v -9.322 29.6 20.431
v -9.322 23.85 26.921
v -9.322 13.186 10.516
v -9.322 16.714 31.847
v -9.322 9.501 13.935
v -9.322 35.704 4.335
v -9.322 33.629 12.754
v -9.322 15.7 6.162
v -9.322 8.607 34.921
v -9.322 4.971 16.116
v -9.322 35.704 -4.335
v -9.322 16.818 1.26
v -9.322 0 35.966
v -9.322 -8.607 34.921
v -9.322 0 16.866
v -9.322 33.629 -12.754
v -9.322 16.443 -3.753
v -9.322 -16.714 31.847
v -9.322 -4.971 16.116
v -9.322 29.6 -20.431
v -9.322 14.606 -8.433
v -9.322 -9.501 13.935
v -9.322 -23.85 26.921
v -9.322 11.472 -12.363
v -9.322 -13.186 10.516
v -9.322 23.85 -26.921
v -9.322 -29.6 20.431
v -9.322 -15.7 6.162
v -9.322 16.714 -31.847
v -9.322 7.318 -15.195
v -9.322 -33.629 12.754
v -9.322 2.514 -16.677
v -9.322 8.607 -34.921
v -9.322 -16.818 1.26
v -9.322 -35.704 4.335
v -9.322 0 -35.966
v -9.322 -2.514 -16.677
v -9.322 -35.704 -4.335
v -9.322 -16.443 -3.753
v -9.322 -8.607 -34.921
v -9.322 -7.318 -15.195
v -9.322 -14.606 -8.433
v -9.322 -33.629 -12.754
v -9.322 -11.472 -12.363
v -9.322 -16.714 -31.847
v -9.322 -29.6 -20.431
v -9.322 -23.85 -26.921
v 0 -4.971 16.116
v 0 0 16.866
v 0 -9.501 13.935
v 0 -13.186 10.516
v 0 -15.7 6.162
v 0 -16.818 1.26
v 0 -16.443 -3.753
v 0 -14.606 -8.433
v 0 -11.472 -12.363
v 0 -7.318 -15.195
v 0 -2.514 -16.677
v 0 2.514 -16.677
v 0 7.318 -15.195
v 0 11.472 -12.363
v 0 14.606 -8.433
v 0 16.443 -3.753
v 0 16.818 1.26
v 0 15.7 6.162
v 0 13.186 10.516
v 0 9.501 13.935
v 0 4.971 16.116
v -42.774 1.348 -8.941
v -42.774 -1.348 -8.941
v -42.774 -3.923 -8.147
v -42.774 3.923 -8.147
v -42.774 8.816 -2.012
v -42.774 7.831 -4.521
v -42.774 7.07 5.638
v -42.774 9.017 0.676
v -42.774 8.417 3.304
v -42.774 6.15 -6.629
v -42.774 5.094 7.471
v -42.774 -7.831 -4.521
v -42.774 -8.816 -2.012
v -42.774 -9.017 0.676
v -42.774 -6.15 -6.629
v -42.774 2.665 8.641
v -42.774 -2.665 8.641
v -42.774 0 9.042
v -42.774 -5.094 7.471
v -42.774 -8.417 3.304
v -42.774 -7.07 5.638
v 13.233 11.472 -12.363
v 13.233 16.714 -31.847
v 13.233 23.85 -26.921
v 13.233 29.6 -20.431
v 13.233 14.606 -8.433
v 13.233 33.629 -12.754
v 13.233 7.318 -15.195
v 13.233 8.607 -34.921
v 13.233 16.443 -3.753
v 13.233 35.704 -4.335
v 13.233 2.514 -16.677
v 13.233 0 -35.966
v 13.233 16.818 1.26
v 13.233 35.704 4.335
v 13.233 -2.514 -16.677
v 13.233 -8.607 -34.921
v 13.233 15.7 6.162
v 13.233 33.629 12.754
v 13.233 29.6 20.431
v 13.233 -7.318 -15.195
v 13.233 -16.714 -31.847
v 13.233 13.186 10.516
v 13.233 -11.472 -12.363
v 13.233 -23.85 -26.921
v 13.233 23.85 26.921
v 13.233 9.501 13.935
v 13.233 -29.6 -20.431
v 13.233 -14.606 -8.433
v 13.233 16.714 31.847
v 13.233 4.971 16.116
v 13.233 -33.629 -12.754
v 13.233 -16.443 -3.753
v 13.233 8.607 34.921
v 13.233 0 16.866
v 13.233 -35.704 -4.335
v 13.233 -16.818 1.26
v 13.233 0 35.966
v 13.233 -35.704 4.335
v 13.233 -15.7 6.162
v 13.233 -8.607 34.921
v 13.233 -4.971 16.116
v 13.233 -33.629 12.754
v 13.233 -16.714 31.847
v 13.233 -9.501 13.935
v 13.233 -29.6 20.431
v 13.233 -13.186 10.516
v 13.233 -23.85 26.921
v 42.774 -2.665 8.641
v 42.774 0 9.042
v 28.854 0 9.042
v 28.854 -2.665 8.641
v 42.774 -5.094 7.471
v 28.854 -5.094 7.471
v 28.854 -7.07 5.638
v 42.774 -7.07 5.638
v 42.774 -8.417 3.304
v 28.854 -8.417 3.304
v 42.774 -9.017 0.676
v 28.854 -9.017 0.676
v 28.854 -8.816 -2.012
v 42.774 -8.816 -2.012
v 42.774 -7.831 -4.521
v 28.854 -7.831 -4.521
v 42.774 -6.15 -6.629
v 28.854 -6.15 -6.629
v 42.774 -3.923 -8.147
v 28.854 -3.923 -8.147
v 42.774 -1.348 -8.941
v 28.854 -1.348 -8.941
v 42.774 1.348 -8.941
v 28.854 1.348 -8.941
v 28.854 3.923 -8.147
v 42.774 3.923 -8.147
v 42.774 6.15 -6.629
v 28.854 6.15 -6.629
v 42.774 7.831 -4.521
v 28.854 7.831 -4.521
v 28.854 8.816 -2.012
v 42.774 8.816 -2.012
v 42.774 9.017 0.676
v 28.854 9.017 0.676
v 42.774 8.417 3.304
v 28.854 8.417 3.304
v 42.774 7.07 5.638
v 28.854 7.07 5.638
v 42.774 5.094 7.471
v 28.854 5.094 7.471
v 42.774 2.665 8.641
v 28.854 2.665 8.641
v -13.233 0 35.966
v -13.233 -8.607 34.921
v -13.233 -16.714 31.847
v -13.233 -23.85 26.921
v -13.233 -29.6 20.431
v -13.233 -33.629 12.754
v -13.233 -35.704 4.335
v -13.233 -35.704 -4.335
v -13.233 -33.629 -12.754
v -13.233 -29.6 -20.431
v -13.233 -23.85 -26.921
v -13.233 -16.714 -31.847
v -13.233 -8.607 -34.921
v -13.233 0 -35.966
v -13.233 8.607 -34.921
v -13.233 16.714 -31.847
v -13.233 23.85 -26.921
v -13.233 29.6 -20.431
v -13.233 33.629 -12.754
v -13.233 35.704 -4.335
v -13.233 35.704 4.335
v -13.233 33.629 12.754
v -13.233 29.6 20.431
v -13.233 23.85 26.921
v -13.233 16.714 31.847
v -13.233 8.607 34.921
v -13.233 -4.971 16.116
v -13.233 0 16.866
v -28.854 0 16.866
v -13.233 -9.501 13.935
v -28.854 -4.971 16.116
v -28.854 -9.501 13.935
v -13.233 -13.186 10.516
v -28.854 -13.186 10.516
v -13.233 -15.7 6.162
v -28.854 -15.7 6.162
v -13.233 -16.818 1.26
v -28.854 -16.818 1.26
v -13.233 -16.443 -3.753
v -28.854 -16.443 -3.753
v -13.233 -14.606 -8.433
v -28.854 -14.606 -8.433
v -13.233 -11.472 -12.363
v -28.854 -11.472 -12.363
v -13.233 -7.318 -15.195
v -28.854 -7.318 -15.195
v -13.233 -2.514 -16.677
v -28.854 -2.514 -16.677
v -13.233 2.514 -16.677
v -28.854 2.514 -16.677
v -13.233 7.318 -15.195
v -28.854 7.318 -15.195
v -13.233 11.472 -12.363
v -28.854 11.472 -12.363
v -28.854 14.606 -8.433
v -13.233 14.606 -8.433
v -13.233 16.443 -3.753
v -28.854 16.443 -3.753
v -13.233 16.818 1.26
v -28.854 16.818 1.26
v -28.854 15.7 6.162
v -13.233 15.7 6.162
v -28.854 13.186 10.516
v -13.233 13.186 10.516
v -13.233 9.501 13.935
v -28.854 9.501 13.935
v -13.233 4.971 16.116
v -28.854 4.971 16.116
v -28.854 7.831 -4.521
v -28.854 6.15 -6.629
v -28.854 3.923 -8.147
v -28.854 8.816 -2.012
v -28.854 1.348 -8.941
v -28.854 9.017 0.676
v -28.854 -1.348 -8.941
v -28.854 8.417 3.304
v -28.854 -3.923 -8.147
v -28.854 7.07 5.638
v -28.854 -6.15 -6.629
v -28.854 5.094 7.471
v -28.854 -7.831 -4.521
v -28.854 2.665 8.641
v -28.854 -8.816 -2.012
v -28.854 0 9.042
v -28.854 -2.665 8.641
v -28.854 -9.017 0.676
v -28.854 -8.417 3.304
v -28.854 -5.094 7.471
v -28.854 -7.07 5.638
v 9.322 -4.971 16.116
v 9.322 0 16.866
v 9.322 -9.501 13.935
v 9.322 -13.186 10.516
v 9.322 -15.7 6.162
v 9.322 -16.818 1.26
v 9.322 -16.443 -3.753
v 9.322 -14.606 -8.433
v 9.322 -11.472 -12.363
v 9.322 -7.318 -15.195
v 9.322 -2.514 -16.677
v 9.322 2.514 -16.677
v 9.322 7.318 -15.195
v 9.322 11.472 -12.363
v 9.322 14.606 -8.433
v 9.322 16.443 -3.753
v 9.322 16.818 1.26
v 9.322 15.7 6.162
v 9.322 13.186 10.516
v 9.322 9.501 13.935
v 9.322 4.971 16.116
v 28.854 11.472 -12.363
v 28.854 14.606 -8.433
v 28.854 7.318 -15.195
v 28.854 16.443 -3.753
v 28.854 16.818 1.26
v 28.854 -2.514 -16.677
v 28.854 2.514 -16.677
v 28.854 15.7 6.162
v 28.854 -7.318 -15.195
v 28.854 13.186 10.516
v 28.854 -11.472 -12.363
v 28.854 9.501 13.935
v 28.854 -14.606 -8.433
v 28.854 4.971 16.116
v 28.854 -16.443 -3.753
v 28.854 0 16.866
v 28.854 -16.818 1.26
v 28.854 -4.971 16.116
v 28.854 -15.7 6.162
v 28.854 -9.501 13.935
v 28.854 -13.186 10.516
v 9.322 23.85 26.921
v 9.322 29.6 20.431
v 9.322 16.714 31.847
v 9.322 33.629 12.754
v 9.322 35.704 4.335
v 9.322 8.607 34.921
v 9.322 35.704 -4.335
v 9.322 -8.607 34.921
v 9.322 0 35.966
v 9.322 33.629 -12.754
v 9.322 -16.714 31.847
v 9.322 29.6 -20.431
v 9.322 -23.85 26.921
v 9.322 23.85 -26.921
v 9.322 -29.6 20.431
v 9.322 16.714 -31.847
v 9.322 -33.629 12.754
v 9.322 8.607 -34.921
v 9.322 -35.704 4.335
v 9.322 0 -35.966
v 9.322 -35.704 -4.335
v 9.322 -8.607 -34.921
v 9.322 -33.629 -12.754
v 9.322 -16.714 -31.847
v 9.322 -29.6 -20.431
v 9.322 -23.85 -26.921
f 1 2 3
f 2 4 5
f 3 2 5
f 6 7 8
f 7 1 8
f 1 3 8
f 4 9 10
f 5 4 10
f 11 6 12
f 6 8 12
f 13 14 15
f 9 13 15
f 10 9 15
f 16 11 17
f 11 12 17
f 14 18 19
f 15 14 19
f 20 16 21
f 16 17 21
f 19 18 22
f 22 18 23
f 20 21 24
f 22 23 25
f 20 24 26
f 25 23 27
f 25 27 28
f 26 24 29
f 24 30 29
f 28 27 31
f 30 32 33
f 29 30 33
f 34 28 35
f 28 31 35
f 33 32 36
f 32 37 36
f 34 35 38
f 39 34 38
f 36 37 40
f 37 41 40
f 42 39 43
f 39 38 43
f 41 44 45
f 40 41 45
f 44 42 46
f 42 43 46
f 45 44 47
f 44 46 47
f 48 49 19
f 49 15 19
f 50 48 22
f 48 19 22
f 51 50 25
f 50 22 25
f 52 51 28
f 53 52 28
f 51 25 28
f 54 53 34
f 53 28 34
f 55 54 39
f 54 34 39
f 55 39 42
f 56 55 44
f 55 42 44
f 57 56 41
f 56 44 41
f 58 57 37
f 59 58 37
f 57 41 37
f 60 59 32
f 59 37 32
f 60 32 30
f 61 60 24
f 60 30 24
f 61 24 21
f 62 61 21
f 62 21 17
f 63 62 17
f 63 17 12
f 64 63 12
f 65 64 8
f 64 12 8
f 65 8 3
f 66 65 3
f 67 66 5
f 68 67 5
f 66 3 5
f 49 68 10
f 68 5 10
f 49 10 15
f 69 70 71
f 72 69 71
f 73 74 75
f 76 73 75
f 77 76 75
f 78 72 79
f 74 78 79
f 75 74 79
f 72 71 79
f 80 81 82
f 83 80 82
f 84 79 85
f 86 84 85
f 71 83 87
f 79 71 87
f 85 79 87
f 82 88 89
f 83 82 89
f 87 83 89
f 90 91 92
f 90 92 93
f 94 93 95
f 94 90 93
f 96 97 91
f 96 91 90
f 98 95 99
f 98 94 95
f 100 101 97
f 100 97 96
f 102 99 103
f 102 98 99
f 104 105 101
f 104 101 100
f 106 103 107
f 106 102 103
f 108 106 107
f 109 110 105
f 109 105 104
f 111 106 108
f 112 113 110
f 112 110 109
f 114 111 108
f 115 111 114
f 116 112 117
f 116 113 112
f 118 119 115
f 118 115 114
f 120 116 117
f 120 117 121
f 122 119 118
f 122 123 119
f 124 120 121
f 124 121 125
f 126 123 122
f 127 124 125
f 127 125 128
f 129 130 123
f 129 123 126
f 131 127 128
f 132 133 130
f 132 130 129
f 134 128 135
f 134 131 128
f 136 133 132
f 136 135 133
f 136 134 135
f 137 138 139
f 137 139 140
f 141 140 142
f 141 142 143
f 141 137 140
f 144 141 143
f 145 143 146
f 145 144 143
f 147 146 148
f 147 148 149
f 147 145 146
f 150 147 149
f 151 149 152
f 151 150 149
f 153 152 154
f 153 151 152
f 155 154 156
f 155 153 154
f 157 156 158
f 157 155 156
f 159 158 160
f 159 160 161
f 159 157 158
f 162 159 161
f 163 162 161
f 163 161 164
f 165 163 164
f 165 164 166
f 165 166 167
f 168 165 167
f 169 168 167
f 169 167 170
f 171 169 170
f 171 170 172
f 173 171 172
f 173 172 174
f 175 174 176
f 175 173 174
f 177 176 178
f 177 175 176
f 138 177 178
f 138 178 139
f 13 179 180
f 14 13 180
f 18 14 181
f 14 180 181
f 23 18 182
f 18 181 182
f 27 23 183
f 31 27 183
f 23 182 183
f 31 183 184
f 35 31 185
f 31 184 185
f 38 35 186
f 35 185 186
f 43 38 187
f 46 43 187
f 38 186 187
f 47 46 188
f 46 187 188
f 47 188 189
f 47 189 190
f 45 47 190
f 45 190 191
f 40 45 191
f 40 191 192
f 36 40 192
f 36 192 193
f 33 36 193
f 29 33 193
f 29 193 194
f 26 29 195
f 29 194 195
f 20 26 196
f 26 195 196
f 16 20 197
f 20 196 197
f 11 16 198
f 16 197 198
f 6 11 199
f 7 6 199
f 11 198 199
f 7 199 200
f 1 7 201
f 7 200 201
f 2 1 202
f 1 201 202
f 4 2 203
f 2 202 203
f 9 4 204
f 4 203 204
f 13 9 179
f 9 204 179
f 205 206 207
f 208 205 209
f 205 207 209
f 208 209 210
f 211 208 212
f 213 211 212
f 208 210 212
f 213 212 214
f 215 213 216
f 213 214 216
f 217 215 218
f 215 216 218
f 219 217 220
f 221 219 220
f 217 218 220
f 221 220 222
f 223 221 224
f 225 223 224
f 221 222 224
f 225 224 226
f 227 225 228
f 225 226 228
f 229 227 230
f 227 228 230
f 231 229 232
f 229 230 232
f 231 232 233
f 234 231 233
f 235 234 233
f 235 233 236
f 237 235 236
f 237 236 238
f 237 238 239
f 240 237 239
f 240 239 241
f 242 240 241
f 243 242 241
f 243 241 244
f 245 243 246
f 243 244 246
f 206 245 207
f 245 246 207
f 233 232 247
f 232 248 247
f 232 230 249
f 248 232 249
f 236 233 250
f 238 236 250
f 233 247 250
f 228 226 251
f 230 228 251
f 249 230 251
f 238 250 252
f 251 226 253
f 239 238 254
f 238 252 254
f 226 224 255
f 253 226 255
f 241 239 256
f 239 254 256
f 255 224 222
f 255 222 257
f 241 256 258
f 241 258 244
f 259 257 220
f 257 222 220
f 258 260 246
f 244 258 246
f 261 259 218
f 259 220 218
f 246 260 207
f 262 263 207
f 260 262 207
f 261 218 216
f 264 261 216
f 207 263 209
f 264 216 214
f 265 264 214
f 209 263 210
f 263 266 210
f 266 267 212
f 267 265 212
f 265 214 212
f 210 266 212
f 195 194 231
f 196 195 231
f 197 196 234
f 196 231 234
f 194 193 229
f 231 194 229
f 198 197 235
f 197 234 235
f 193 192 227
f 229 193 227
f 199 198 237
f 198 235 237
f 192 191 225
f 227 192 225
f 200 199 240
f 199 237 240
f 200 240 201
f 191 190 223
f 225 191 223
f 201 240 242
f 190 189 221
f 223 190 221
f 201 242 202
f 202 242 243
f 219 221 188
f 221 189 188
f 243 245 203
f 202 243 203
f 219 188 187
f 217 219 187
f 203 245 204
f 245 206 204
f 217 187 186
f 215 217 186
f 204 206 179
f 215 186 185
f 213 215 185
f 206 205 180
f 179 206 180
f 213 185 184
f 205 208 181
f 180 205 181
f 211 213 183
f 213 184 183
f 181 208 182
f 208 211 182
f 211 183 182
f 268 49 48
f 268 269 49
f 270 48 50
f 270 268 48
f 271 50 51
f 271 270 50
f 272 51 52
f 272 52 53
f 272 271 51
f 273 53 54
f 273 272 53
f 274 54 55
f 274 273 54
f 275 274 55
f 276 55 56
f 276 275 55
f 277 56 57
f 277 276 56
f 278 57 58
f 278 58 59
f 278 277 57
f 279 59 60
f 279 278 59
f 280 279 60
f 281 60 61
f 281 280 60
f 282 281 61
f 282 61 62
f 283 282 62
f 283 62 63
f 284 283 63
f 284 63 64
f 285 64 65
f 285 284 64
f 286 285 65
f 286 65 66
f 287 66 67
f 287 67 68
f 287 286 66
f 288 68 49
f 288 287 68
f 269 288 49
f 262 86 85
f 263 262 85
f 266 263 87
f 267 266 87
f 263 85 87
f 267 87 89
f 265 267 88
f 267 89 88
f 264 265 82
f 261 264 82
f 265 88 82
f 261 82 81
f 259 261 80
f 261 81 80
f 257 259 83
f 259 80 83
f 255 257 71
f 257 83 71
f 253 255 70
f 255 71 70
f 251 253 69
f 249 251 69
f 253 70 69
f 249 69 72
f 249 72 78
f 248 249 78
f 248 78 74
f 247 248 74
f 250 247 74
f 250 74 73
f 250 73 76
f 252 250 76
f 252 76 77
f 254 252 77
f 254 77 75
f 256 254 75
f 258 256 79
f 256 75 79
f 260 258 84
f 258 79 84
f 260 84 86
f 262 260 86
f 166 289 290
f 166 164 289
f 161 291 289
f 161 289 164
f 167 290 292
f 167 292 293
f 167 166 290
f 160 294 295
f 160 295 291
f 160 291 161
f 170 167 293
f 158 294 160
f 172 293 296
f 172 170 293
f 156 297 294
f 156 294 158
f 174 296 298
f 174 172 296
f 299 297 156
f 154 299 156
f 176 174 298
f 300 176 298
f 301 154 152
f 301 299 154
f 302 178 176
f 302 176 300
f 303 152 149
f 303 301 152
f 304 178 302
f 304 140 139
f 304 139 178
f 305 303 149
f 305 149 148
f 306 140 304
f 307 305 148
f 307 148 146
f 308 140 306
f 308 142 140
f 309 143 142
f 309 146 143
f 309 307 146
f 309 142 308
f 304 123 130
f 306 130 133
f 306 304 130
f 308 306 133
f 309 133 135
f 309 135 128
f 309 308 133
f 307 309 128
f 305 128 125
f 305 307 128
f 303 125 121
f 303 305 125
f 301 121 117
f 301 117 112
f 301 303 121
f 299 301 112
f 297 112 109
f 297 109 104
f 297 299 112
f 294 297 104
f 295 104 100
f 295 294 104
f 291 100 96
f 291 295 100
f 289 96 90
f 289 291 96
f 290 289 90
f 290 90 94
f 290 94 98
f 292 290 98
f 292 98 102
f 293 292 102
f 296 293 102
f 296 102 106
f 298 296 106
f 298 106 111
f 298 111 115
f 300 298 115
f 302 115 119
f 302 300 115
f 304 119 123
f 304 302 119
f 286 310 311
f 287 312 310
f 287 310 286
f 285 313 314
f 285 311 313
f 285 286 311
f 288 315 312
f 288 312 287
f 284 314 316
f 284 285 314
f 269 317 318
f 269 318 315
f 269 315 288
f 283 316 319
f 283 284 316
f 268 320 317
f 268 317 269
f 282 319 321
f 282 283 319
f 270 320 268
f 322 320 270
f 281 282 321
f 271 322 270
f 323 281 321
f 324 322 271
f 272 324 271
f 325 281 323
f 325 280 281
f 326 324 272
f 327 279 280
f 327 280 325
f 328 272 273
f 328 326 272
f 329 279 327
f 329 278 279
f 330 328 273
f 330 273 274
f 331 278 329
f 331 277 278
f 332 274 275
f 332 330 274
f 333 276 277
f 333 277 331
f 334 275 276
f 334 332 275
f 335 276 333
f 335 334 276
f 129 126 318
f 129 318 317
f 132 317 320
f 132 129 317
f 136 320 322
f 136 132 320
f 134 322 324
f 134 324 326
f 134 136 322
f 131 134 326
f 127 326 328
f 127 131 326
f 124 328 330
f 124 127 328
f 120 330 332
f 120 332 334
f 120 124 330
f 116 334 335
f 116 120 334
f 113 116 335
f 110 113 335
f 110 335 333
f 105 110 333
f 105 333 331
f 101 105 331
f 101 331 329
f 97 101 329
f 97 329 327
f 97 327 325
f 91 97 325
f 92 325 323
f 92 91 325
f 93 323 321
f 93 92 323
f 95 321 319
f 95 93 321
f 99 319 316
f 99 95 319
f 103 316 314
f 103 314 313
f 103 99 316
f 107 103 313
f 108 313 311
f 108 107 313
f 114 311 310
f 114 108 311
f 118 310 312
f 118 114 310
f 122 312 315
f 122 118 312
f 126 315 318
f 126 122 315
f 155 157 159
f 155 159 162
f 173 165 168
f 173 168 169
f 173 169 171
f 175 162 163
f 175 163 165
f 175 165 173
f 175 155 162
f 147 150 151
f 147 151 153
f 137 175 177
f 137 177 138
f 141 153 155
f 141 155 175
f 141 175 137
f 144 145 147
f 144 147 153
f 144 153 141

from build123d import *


with BuildPart() as f1:
    # F0 (on Front) → F1 (revolve)
    with BuildSketch(Plane.XZ):
        Polygon((-9.3218, 35.9664), (-13.2334, 35.9664), (-13.2334, 16.8656), (-28.853873, 16.8656), (-28.853873, 9.0424), (-42.7736, 9.0424), (-42.7736, 0), (0, 0), (0, 16.8656), (-9.3218, 16.8656), align=None)
    revolve(axis=Axis((-21.3868, 0, 0), (1, 0, 0)))

    # F0 (on Front) → F2 (revolve)
    with BuildSketch(Plane.XZ):
        Polygon((-9.3218, 35.9664), (-13.2334, 35.9664), (-13.2334, 16.8656), (-28.853873, 16.8656), (-28.853873, 9.0424), (-42.7736, 9.0424), (-42.7736, 0), (0, 0), (0, 16.8656), (-9.3218, 16.8656), align=None)
    revolve(axis=Axis((0, 0, 0), (-1, 0, 0)))

    # F3: F1 across plane


with BuildPart() as f1_1:
    add(f1.part)
    add(f1.part.mirror(Plane.YZ))


solid = f1_1.part
